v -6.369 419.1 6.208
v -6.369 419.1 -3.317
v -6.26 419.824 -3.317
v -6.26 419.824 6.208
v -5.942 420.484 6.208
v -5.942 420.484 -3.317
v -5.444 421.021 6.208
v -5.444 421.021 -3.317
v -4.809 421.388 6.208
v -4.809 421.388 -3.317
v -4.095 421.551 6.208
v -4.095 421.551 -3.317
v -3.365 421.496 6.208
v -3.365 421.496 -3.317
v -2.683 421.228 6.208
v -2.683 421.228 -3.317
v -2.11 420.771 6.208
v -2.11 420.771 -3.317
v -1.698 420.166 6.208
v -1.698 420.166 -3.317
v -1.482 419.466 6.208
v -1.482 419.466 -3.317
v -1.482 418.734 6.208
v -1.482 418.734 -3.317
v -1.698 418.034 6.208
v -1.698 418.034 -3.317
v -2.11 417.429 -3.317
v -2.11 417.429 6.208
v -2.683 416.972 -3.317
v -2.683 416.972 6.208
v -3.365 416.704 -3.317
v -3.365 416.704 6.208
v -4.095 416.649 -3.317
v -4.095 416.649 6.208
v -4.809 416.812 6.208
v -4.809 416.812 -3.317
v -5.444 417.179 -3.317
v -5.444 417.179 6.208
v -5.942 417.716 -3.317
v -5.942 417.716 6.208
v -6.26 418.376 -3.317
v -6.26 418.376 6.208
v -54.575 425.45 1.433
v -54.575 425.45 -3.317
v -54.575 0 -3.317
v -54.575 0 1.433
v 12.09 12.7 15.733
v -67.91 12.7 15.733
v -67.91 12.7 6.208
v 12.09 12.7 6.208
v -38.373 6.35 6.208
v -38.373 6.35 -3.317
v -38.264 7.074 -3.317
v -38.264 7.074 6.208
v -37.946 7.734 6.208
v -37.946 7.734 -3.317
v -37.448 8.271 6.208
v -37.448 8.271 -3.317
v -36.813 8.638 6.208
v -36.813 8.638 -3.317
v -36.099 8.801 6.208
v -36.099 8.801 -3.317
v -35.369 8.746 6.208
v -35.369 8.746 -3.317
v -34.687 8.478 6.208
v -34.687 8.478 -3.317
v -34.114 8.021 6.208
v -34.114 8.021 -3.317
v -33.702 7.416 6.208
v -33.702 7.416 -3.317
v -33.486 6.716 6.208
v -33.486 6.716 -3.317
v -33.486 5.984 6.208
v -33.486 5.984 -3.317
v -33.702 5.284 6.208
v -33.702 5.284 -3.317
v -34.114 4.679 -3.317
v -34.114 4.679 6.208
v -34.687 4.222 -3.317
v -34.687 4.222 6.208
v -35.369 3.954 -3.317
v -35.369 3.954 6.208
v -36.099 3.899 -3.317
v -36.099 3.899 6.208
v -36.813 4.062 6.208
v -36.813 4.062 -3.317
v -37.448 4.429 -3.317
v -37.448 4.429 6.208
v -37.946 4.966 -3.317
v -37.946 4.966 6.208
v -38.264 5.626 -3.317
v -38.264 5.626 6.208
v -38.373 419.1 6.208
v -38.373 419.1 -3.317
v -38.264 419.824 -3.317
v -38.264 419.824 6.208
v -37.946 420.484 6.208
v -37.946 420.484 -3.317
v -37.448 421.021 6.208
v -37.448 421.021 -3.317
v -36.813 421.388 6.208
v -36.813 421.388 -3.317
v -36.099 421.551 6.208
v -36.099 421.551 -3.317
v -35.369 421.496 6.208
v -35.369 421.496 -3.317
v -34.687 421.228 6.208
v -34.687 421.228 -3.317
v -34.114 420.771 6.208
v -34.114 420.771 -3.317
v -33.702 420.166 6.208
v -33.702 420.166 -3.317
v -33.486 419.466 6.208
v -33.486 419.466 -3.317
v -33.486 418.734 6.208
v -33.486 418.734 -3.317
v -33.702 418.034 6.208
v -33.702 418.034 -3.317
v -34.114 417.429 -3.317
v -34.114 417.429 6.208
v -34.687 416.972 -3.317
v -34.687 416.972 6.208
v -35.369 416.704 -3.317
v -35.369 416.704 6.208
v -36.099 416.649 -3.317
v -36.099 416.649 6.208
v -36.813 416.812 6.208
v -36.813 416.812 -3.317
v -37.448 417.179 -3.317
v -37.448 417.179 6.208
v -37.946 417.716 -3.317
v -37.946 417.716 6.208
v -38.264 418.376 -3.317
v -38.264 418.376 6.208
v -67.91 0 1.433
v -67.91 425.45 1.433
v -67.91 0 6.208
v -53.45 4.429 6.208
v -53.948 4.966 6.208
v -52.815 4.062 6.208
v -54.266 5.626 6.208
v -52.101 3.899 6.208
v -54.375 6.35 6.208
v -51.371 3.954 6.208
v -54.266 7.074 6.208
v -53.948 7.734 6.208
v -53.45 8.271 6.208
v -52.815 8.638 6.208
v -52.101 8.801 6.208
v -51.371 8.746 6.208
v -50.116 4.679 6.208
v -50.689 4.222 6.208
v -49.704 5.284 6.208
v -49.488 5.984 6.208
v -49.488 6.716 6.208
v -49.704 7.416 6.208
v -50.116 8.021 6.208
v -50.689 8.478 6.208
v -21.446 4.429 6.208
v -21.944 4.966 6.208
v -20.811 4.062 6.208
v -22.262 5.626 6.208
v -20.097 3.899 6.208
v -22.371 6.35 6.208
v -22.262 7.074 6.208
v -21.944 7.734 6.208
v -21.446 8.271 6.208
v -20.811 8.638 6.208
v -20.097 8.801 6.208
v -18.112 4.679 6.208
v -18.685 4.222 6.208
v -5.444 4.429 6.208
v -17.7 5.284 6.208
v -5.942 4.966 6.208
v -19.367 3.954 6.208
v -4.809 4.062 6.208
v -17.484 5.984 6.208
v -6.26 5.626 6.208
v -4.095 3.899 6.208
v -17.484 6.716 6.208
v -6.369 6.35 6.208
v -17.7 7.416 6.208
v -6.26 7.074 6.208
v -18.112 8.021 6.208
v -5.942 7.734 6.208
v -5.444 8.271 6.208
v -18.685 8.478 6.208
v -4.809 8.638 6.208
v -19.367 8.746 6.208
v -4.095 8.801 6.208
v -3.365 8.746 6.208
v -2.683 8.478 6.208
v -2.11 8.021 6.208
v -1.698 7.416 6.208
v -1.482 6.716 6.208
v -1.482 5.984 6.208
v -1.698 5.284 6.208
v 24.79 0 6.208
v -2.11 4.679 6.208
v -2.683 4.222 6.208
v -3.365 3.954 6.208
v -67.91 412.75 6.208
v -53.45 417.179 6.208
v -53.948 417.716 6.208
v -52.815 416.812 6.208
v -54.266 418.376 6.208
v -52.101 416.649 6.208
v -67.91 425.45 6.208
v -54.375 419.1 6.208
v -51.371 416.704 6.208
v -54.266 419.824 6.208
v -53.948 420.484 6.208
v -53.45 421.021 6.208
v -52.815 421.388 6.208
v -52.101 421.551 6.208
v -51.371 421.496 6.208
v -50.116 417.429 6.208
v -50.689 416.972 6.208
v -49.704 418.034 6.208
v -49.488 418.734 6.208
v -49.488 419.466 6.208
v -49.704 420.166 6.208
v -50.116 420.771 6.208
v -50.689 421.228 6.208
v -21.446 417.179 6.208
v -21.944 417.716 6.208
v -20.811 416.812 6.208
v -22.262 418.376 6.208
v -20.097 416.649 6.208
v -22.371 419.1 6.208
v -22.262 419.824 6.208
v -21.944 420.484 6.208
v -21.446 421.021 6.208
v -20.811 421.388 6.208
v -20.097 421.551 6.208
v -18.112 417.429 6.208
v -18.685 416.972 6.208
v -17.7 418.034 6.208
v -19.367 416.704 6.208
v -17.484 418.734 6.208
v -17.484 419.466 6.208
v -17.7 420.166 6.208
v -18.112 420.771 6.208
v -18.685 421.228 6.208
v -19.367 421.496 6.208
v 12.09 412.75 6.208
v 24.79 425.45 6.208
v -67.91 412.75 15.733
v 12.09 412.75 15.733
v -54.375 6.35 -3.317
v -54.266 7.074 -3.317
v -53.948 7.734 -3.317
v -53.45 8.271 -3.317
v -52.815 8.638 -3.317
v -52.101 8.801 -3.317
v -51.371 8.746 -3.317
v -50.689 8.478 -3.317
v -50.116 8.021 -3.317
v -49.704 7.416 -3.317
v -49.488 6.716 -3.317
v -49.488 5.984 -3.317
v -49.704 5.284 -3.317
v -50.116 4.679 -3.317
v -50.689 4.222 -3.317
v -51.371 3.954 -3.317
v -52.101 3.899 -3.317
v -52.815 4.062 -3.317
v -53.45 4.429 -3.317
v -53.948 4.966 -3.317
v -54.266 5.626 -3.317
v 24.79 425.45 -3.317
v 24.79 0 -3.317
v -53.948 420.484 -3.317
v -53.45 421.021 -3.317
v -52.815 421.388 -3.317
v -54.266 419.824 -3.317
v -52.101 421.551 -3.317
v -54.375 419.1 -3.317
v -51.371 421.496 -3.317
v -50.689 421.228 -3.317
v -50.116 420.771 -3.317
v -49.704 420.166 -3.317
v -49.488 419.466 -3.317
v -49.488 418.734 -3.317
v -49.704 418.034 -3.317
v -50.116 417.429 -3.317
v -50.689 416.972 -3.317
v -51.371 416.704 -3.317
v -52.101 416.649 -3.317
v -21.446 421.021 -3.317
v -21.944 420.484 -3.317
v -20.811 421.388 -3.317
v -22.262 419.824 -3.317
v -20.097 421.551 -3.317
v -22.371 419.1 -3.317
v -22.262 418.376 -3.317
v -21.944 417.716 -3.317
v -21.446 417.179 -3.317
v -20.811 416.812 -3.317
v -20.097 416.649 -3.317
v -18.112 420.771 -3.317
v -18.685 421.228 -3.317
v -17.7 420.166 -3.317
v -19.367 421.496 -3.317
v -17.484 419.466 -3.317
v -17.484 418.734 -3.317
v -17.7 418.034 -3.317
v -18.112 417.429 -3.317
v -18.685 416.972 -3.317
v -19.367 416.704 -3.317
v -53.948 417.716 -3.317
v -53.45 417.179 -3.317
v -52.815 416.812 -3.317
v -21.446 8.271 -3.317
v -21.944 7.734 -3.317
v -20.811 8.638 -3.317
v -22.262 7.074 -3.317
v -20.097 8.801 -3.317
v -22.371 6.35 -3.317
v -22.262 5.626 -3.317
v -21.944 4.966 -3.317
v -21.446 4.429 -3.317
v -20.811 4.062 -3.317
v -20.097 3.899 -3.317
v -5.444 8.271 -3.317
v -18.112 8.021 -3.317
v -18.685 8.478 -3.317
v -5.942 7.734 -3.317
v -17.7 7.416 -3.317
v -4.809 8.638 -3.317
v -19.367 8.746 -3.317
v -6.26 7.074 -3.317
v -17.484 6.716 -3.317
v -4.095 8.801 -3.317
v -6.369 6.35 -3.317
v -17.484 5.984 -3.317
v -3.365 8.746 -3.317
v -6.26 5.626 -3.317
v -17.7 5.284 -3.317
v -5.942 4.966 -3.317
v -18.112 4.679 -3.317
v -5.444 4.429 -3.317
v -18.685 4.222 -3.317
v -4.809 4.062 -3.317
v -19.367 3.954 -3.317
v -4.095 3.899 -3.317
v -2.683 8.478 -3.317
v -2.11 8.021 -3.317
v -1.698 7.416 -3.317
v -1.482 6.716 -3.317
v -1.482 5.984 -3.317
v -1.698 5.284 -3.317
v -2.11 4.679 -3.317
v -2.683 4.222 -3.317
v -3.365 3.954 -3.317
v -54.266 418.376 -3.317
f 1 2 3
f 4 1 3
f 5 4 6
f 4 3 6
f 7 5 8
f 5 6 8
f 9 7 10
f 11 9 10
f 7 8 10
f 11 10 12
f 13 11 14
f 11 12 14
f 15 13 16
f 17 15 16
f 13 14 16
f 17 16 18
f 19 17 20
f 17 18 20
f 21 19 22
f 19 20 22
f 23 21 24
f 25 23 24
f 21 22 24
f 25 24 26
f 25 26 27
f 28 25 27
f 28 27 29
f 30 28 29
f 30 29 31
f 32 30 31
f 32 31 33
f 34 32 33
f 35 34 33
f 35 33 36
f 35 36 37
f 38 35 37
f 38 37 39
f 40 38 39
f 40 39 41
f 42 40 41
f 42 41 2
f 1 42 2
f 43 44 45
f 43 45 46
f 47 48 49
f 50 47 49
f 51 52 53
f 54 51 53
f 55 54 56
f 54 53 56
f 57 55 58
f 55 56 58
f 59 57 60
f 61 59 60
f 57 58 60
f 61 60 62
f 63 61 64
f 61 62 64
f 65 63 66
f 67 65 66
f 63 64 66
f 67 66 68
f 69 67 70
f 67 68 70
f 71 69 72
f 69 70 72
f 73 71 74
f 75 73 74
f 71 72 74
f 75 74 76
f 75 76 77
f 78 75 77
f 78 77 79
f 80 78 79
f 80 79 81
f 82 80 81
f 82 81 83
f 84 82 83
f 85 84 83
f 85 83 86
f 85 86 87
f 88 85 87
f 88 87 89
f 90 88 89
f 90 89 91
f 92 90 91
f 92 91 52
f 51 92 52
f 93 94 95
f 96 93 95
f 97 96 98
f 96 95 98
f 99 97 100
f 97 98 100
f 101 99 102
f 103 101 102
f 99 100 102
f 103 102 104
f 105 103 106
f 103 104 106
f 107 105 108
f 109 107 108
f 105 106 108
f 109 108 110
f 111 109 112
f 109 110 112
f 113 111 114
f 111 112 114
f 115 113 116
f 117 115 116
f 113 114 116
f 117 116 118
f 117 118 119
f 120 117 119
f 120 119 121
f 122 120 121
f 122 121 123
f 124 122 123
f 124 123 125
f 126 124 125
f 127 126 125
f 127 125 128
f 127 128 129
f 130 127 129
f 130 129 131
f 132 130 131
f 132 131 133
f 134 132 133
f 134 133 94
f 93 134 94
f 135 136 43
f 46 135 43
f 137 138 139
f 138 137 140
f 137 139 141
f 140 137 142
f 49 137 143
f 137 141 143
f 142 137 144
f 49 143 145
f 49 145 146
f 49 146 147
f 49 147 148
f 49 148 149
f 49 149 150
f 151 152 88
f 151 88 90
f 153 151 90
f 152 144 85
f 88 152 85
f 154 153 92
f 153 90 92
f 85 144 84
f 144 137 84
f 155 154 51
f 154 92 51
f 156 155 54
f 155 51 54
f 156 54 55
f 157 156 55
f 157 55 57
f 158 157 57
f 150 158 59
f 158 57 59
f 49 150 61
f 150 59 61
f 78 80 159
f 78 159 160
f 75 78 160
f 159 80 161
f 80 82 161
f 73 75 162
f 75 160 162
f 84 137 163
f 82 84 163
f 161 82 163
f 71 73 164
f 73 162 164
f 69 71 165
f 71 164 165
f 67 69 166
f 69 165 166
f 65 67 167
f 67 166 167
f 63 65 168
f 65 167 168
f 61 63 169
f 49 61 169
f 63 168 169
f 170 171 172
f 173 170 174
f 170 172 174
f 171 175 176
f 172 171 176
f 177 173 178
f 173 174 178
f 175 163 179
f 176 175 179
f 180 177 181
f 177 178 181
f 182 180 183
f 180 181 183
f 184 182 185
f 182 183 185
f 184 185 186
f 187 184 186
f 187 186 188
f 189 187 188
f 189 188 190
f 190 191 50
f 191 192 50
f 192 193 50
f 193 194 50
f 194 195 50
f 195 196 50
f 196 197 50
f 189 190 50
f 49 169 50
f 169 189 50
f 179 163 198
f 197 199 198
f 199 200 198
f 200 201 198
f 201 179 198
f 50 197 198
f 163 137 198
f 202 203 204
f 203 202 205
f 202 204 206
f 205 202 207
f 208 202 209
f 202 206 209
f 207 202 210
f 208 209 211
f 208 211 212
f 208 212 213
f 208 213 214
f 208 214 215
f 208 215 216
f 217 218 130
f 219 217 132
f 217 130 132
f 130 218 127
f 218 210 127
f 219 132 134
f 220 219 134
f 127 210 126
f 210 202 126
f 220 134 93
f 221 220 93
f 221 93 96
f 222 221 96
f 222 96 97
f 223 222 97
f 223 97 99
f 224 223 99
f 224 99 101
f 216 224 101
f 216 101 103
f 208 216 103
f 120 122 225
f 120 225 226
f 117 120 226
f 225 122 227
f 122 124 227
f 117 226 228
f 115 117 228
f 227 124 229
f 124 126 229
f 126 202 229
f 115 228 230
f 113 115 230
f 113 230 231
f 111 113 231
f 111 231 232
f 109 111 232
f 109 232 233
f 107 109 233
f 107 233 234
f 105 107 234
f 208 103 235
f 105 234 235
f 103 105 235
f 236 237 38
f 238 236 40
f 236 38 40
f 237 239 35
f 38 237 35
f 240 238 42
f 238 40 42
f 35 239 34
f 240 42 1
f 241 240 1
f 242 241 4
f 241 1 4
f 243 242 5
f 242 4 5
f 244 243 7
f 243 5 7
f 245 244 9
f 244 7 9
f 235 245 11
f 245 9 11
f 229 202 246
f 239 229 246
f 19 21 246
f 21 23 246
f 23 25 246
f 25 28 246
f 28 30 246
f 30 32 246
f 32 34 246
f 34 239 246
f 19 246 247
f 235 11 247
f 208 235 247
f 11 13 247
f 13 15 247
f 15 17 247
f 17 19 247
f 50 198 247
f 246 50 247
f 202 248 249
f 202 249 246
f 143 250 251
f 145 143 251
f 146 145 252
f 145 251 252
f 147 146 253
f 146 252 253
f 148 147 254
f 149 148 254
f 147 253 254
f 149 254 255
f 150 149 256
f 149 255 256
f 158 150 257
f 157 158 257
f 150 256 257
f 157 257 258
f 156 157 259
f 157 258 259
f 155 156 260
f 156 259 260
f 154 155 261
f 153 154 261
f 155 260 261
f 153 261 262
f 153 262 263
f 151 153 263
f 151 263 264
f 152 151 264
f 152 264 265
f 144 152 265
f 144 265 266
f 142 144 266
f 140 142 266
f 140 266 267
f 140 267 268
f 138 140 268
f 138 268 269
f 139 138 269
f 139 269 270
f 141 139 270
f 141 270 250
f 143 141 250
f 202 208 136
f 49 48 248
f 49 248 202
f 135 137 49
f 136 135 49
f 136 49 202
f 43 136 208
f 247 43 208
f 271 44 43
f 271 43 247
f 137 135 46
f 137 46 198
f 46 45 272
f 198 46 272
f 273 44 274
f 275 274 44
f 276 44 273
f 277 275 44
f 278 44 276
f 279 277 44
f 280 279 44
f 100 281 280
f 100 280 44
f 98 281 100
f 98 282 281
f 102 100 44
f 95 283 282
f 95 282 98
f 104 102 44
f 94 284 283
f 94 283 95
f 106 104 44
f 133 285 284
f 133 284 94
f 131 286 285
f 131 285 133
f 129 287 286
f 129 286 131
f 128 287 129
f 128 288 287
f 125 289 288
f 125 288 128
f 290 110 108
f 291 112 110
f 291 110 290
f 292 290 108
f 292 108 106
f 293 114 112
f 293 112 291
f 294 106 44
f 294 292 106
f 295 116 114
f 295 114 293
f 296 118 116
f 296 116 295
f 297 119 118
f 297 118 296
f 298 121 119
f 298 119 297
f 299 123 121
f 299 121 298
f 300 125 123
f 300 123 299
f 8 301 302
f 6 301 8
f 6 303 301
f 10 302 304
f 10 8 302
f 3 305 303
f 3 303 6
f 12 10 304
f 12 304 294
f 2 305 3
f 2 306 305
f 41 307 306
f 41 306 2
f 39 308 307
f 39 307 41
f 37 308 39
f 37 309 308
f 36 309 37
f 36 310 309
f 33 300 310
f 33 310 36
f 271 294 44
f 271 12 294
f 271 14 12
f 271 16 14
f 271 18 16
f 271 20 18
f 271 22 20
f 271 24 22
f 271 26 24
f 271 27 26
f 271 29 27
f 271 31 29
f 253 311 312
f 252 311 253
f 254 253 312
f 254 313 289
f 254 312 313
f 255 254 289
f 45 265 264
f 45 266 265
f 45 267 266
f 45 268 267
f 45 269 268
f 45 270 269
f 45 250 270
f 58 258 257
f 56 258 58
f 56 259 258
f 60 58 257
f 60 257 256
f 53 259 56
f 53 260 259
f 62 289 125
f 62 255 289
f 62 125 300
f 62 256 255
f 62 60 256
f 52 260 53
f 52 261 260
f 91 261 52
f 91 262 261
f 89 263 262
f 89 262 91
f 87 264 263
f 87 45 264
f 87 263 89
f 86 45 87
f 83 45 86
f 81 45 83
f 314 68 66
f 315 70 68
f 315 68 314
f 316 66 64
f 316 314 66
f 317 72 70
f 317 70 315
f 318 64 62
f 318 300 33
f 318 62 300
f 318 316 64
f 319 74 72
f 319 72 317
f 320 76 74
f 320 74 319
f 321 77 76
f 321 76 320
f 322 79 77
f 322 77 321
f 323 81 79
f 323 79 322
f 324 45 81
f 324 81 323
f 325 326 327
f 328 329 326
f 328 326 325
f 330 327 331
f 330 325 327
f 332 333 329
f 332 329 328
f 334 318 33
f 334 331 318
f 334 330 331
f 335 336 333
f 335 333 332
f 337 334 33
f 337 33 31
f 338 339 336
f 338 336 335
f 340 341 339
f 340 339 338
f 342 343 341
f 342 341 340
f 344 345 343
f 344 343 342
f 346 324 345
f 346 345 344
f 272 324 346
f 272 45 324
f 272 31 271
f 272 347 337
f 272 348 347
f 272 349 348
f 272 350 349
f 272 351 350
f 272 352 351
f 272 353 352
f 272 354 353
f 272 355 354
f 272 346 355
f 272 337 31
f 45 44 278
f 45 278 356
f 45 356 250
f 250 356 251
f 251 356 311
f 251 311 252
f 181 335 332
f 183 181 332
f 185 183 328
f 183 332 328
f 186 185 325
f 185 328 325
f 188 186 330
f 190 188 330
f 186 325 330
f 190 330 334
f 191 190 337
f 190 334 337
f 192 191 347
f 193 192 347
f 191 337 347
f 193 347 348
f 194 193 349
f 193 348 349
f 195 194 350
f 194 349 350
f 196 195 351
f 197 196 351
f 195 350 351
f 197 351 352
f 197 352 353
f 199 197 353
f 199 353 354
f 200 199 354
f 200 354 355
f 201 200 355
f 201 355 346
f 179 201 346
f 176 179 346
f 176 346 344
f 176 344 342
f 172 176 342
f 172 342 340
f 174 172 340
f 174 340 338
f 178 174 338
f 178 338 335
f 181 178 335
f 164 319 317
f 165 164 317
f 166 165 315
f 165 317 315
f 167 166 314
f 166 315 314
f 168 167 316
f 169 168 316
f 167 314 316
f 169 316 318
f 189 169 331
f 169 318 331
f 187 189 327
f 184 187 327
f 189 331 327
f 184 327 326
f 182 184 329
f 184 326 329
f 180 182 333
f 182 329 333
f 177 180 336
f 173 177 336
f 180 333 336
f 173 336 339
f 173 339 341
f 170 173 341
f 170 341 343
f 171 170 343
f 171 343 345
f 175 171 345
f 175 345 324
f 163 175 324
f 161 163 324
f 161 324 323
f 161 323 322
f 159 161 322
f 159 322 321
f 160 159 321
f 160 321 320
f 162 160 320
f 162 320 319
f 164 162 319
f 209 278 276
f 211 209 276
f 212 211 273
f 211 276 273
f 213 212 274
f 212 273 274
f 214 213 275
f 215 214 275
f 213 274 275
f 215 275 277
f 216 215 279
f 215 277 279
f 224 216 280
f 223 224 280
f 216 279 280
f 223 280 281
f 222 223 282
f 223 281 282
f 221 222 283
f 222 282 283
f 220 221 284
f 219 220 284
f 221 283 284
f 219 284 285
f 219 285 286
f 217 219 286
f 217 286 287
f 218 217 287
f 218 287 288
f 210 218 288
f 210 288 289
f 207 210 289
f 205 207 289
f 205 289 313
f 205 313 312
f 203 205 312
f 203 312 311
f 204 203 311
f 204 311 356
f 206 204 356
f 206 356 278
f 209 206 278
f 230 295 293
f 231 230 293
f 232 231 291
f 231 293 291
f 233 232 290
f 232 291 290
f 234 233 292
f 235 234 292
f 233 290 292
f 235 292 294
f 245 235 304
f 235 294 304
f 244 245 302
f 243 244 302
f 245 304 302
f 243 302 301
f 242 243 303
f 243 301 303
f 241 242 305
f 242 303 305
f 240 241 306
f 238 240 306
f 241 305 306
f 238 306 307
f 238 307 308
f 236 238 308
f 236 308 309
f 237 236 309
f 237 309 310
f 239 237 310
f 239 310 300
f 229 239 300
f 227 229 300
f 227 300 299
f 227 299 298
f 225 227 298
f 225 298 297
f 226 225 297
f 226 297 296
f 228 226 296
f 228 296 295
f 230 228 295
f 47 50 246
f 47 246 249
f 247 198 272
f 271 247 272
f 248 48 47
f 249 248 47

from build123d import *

# Parameters (mm, degrees)
SKETCH1_W             = 92.7
SKETCH1_H             = 19.05
BOSS_EXTRUDE1_DEPTH   = 425.45
SKETCH2_W             = 9.525
SKETCH2_H             = 12.7
CUT_EXTRUDE1_DEPTH    = 436.716109536
SKETCH3_W             = 12.7
SKETCH3_H             = 9.525
CUT_EXTRUDE2_DEPTH    = 419.595052861
F_8_CLEARANCE_HOLE1_D = 4.9149
SKETCH6_W             = 13.335
SKETCH6_H             = 4.7498
CUT_EXTRUDE5_DEPTH    = 436.848477111


with BuildPart() as part:
    # Sketch1 → Boss-Extrude1 (new body)
    with BuildSketch(Plane(origin=(0, 0, 0), x_dir=(1, 0, 0), z_dir=(0, 1, 0))):
        with Locations((-21.55964711, -6.208264412)):
            Rectangle(SKETCH1_W, SKETCH1_H)
    extrude(amount=BOSS_EXTRUDE1_DEPTH)

    # Sketch2 → Cut-Extrude1 (cut, through all)
    with BuildSketch(Plane(origin=(24.79035289, 0, 0), x_dir=(0, 0, -1), z_dir=(1, 0, 0))):
        with Locations((-10.970764412, 419.1)):
            Rectangle(SKETCH2_W, SKETCH2_H)
        with Locations((-10.970764412, 6.35)):
            Rectangle(SKETCH2_W, SKETCH2_H)
    extrude(amount=-CUT_EXTRUDE1_DEPTH, mode=Mode.SUBTRACT)

    # Sketch3 → Cut-Extrude2 (cut, through all)
    with BuildSketch(Plane.XZ.offset(-12.7)):
        with Locations((18.44035289, 10.970764412)):
            Rectangle(SKETCH3_W, SKETCH3_H)
    extrude(amount=-CUT_EXTRUDE2_DEPTH, mode=Mode.SUBTRACT)

    # #8 Clearance Hole1 (through all)
    with Locations(Plane.XY.offset(6.208264412)):
        with Locations((-51.91764711, 6.35), (-35.91564711, 6.35), (-19.91364711, 6.35), (-3.91164711, 6.35), (-51.91764711, 419.1), (-35.91564711, 419.1), (-19.91364711, 419.1), (-3.91164711, 419.1)):
            Hole(F_8_CLEARANCE_HOLE1_D / 2)

    # Sketch6 → Cut-Extrude5 (cut, through all)
    with BuildSketch(Plane(origin=(-67.90964711, 425.45, -3.316735588), x_dir=(1, 0, 0), z_dir=(0, -1, 0))):
        with Locations((6.6675, 2.3749)):
            Rectangle(SKETCH6_W, SKETCH6_H)
    extrude(amount=CUT_EXTRUDE5_DEPTH, mode=Mode.SUBTRACT)


solid = part.part
